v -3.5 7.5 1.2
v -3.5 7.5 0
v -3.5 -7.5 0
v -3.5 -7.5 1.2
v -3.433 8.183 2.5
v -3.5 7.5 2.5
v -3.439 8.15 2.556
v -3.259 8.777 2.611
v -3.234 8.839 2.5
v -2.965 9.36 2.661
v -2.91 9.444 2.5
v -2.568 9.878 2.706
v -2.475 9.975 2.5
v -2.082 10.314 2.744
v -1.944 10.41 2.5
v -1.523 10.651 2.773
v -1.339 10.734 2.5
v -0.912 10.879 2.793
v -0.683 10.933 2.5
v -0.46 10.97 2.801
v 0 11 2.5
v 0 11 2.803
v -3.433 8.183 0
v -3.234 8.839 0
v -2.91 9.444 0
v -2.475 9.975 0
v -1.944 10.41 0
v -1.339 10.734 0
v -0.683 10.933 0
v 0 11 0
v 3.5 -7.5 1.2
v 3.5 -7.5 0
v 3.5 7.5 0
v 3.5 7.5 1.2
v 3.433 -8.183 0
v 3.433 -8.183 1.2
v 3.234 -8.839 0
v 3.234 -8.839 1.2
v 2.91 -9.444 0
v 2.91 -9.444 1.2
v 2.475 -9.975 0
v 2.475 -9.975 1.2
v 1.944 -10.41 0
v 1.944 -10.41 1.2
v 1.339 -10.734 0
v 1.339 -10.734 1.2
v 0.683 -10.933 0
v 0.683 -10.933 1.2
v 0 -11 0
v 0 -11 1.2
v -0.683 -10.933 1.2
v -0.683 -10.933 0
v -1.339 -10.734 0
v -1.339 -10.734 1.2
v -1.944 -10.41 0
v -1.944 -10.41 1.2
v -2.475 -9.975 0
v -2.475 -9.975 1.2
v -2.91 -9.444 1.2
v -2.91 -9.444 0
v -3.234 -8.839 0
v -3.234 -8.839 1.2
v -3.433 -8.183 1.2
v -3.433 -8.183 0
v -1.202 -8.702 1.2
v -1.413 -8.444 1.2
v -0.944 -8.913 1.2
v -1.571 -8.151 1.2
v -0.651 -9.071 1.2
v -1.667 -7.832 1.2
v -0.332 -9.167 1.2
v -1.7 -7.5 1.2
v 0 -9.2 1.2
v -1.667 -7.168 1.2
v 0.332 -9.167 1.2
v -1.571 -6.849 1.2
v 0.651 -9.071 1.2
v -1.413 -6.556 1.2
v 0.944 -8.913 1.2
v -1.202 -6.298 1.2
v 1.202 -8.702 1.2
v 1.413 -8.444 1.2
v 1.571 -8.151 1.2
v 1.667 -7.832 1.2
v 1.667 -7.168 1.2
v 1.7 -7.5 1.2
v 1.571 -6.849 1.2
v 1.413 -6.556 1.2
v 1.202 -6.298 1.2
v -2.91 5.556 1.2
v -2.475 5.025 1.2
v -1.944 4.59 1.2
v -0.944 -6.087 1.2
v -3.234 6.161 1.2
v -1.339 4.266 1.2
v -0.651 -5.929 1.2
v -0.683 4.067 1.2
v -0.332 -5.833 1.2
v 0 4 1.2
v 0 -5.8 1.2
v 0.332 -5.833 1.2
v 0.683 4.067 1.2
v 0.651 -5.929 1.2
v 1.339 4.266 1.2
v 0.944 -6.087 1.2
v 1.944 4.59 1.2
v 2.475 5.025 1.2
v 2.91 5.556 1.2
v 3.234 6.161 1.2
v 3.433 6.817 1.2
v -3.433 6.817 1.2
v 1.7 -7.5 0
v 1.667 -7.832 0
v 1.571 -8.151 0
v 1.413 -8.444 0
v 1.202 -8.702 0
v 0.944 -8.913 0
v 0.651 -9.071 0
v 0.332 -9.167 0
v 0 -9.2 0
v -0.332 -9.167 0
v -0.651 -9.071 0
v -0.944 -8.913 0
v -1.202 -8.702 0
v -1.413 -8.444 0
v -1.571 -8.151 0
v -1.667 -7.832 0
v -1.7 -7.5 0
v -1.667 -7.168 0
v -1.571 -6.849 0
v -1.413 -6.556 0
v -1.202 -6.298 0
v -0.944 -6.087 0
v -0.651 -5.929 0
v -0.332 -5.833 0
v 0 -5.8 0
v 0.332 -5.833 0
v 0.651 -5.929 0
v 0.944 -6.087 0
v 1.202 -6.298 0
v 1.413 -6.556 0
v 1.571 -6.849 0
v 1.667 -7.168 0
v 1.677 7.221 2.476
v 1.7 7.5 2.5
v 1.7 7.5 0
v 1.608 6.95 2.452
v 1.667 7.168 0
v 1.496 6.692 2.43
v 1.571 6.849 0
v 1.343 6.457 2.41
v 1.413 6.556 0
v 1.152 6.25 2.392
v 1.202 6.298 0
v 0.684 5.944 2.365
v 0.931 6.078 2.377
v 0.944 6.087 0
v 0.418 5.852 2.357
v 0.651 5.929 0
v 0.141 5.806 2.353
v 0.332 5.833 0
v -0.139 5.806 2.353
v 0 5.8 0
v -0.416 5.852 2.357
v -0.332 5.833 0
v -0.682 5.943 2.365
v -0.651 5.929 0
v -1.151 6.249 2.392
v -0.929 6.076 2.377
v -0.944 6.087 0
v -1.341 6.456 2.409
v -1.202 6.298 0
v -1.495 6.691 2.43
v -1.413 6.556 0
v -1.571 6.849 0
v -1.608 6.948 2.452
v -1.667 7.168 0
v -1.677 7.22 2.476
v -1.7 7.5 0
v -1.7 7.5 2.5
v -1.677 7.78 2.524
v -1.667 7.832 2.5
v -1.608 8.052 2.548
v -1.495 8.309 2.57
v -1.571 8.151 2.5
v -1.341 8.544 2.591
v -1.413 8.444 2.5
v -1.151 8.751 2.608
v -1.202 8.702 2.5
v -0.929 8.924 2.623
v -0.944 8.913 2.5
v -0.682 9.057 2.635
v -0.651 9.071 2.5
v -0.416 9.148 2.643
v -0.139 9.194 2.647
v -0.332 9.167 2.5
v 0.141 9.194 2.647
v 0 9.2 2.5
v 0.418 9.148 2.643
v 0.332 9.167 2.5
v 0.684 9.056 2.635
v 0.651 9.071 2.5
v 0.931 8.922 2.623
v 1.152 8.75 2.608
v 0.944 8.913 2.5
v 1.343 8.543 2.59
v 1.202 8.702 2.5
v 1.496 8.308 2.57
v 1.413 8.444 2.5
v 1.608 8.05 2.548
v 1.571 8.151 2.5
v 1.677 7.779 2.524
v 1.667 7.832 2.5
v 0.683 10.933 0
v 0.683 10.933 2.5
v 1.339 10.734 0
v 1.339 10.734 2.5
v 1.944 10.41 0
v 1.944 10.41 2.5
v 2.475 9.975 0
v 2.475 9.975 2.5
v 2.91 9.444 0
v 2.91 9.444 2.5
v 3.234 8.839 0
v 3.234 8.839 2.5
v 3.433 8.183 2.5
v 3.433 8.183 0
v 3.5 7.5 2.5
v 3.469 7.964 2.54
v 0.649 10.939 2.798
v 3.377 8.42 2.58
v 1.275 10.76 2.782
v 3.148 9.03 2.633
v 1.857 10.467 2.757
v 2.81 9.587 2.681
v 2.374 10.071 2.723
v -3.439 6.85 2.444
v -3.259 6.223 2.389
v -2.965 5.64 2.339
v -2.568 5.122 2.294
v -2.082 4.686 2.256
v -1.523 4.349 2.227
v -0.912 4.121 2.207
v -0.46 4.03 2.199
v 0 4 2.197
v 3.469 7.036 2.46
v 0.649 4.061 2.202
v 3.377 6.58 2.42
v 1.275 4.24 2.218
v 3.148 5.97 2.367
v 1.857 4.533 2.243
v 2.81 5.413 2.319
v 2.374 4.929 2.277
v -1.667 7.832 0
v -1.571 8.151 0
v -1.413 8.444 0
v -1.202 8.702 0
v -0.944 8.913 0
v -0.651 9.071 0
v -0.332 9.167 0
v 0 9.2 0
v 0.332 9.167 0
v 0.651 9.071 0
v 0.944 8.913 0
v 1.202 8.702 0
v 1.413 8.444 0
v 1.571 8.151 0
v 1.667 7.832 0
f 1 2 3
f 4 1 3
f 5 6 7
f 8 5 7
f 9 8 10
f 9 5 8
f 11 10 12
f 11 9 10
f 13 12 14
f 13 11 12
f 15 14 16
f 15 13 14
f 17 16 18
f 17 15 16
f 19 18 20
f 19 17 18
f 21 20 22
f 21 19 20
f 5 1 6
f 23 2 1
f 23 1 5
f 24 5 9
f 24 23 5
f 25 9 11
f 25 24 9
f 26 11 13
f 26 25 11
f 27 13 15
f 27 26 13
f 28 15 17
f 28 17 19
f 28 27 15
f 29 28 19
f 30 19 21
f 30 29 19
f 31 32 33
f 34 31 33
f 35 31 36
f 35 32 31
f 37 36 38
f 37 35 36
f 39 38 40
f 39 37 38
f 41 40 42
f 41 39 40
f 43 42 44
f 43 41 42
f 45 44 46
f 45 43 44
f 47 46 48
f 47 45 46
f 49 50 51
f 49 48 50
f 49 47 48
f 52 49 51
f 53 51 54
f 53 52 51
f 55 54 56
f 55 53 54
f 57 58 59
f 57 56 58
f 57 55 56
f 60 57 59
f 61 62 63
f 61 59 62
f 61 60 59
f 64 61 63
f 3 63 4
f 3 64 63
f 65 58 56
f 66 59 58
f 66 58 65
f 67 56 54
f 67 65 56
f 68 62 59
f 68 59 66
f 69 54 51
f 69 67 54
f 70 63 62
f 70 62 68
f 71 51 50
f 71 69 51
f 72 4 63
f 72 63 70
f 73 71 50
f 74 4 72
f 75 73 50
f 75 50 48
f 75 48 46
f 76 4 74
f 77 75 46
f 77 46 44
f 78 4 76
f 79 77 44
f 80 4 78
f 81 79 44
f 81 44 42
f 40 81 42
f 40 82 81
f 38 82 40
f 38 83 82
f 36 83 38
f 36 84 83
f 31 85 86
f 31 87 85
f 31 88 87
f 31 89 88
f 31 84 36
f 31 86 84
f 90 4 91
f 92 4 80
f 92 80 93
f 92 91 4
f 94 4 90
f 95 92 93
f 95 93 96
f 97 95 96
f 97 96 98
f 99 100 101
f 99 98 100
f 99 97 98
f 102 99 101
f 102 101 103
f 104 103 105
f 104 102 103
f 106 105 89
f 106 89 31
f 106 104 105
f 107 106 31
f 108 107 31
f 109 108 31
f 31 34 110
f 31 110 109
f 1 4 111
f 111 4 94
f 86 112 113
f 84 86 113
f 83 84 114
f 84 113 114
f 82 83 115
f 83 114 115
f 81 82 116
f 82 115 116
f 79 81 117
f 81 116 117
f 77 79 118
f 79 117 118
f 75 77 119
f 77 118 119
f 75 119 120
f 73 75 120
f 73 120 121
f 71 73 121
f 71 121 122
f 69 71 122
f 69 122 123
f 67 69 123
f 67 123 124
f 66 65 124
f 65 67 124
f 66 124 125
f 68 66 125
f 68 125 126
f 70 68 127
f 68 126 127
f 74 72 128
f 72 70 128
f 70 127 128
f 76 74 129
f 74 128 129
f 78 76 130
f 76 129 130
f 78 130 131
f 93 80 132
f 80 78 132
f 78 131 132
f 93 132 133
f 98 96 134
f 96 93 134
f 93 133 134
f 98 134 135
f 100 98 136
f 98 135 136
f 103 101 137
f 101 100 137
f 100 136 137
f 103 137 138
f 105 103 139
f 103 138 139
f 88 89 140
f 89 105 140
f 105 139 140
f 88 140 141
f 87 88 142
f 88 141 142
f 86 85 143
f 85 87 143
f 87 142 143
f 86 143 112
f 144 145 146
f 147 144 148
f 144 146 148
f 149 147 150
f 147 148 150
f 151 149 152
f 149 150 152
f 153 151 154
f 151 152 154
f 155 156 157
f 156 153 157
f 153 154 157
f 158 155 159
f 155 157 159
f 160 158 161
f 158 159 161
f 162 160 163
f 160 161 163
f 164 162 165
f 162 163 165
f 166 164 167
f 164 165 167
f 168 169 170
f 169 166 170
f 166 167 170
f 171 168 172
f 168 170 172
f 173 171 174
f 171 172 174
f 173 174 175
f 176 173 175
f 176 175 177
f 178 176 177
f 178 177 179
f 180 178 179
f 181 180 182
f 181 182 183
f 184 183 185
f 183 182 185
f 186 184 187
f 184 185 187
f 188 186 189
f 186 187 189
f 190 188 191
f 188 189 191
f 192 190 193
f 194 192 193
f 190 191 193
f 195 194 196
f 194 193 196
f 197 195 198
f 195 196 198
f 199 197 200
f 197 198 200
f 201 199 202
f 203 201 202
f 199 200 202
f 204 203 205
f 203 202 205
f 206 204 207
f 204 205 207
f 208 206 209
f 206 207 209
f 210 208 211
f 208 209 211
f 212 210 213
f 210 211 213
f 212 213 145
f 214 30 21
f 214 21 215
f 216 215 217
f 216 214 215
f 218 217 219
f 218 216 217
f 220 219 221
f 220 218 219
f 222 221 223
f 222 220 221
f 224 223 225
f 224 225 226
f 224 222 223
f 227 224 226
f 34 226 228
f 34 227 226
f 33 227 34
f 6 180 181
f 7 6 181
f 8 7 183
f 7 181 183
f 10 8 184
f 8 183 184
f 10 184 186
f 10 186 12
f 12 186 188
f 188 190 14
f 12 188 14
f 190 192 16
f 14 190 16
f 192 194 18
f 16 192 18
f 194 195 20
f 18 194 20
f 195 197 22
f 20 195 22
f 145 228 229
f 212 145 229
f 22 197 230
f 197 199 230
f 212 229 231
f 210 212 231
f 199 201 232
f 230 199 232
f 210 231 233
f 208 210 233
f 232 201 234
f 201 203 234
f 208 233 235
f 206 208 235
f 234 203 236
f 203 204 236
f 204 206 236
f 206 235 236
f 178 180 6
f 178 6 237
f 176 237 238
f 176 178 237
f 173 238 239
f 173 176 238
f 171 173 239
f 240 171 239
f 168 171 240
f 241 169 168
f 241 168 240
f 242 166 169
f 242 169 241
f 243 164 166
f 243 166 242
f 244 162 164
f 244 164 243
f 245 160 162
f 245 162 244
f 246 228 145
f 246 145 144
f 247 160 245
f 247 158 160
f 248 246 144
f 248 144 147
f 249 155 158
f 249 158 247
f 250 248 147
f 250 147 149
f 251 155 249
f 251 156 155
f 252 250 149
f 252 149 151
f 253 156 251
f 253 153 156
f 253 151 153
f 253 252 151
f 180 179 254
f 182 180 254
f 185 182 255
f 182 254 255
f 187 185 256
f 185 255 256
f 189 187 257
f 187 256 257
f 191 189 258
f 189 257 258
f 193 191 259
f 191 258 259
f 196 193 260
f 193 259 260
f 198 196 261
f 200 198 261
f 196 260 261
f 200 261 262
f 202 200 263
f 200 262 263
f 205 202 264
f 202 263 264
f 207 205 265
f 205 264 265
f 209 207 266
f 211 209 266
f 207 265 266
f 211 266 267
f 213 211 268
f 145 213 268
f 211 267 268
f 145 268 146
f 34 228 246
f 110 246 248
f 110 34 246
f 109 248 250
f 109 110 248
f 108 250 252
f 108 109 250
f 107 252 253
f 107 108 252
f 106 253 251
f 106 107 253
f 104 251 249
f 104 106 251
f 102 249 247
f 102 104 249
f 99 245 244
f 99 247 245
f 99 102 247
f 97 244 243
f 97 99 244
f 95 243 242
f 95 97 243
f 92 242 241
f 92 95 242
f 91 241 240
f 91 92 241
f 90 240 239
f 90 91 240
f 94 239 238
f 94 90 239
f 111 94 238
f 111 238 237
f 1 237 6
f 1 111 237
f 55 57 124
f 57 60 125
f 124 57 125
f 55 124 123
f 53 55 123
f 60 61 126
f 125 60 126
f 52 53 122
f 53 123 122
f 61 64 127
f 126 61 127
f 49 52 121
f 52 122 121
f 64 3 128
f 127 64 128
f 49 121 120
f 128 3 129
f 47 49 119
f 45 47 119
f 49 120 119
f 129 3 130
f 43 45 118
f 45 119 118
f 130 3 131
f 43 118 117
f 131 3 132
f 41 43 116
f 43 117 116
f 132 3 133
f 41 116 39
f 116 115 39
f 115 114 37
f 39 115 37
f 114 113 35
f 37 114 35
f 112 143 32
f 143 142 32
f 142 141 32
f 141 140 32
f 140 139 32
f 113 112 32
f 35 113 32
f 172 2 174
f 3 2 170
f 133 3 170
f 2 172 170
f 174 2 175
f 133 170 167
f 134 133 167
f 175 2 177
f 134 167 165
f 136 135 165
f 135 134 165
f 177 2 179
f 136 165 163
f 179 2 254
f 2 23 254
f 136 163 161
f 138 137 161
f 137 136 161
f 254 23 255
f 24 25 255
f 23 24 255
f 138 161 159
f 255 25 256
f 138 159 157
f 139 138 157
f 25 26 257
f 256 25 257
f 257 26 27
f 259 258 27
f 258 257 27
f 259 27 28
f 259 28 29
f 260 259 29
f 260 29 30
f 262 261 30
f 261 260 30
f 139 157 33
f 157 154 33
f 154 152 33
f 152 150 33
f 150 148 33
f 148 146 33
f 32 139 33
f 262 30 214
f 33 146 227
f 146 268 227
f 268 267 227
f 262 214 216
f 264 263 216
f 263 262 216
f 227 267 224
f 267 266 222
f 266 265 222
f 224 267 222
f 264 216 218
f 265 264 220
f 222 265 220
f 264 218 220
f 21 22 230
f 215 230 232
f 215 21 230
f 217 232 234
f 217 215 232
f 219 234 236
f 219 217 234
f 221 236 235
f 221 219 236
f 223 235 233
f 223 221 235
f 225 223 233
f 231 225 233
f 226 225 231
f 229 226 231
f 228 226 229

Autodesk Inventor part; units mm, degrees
ref_plane "YZ Plane" through (0, 0, 0) normal (1, 0, 0) x (0, 1, 0)
ref_plane "XZ Plane" through (0, 0, 0) normal (0, 1, 0) x (-1, 0, 0)
ref_plane "XY Plane" through (0, 0, 0) normal (0, 0, 1) x (1, 0, 0)
sketch "Náčrt1" plane through (0, 0, 0) normal (0, 0, 1) x (1, 0, 0)
  line L0 (0, 7.5) -> (0, -7.5) construction
  line L1 (-3.5, 7.5) -> (-3.5, -7.5)
  line L2 (3.5, -7.5) -> (3.5, 7.5)
  arc A0 (3.5, 7.5) -> (-3.5, 7.5) centre (0, 7.5) ccw
  arc A1 (-3.5, -7.5) -> (3.5, -7.5) centre (0, -7.5) ccw
  circle A2 centre (0, 7.5) radius 1.7
  circle A3 centre (0, -7.5) radius 1.7
  circle A4 centre (0, 7.5) radius 3.5
  point P0 (0, 0)
  point P1 (0, 0)
  point P2 (3.5, 7.5)
  dimension "d0" = 15
  dimension "d1" = 3.5
  dimension "d2" = 3.4
extrude "Vysunutí1" add sketch "Náčrt1" along normal blind 1.2
extrude "Vysunutí2" add sketch "Náčrt1" along normal blind 2.5 contours A0 A4
sketch "Náčrt4" plane through (3.5, -7.5, 0) normal (1, 0, 0) x (0, 0, -1)
  line L0 (-2.5, 13.3) -> (-2.5, 16.7) projected
  line L1 (-1.2, -1.7) -> (-1.2, 1.7) projected
  line L2 (-2.5, 15) -> (-1.2, 0)
  line L3 (-2.5, 18.5) -> (-2.5, 11.5) projected
  line L4 (0, 15) -> (0, 15) projected
  line L5 (0, 15) -> (-1.2, 15) projected
  line L6 (-1.2, 15) -> (-1.2, 15) projected
  line L7 (0, 15) -> (-1.2, 15) projected
  line L8 (-1.2, 11.5) -> (-2.5, 11.5) projected
  line L9 (-2.5, 15) -> (-2.8033, 18.5)
  line L10 (-2.5, 18.5) -> (-2.8033, 18.5)
  point P0 (0, 7.5)
  point P1 (-2.1967, 11.5)
extrude "Vysunutí3" cut sketch "Náčrt4" against normal through all contours L0 L2 L8 L3
extrude "Vysunutí4" add sketch "Náčrt4" against normal up to surface (7 mm away) contours L9 L10 L3 L0
sketch "Náčrt5" plane through (0, 0, 0) normal (0, 0, -1) x (-1, 0, 0)
  circle A0 centre (0, 7.5) radius 1.7 projected
  circle A1 centre (0, -7.5) radius 1.7 projected
  line L0 (-3.5, -7.5) -> (-3.5, 7.5) projected
  arc A2 (-3.5, -7.5) -> (3.5, -7.5) centre (0, -7.5) ccw projected
  line L1 (3.5, 7.5) -> (3.5, -7.5) projected
  arc A3 (3.5, 7.5) -> (-3.5, 7.5) centre (0, 7.5) ccw projected
  arc A4 (1.7, 7.5) -> (-1.7, 7.5) centre (0, 7.5) ccw projected
  line L2 (-1.7, 7.5) -> (1.7, 7.5) projected
  arc A5 (3.5, 7.5) -> (0, 11) centre (0, 7.5) ccw projected
  line L3 (3.5, 11) -> (3.5, 7.5) projected
  line L4 (0, 11) -> (3.5, 11) projected
  arc A6 (0, 11) -> (-3.5, 7.5) centre (0, 7.5) ccw projected
  line L5 (-3.5, 11) -> (0, 11) projected
  line L6 (-3.5, 7.5) -> (-3.5, 11) projected
  point P0 (0, 0)
  point P1 (3.5, 7.5)
  point P2 (0, 11)
  point P3 (0, 11)
  point P4 (0, 11)
  point P5 (-3.5, 7.5)
  point P6 (-1.7, 7.5)
  point P7 (1.7, 7.5)
extrude "Vysunutí5" cut sketch "Náčrt5" against normal through all contours L2 A0 | L6 L5 A3 | L4 L3 A3 picked at (0.5018, 7.7633)
properties part number "back qre flex holder"
